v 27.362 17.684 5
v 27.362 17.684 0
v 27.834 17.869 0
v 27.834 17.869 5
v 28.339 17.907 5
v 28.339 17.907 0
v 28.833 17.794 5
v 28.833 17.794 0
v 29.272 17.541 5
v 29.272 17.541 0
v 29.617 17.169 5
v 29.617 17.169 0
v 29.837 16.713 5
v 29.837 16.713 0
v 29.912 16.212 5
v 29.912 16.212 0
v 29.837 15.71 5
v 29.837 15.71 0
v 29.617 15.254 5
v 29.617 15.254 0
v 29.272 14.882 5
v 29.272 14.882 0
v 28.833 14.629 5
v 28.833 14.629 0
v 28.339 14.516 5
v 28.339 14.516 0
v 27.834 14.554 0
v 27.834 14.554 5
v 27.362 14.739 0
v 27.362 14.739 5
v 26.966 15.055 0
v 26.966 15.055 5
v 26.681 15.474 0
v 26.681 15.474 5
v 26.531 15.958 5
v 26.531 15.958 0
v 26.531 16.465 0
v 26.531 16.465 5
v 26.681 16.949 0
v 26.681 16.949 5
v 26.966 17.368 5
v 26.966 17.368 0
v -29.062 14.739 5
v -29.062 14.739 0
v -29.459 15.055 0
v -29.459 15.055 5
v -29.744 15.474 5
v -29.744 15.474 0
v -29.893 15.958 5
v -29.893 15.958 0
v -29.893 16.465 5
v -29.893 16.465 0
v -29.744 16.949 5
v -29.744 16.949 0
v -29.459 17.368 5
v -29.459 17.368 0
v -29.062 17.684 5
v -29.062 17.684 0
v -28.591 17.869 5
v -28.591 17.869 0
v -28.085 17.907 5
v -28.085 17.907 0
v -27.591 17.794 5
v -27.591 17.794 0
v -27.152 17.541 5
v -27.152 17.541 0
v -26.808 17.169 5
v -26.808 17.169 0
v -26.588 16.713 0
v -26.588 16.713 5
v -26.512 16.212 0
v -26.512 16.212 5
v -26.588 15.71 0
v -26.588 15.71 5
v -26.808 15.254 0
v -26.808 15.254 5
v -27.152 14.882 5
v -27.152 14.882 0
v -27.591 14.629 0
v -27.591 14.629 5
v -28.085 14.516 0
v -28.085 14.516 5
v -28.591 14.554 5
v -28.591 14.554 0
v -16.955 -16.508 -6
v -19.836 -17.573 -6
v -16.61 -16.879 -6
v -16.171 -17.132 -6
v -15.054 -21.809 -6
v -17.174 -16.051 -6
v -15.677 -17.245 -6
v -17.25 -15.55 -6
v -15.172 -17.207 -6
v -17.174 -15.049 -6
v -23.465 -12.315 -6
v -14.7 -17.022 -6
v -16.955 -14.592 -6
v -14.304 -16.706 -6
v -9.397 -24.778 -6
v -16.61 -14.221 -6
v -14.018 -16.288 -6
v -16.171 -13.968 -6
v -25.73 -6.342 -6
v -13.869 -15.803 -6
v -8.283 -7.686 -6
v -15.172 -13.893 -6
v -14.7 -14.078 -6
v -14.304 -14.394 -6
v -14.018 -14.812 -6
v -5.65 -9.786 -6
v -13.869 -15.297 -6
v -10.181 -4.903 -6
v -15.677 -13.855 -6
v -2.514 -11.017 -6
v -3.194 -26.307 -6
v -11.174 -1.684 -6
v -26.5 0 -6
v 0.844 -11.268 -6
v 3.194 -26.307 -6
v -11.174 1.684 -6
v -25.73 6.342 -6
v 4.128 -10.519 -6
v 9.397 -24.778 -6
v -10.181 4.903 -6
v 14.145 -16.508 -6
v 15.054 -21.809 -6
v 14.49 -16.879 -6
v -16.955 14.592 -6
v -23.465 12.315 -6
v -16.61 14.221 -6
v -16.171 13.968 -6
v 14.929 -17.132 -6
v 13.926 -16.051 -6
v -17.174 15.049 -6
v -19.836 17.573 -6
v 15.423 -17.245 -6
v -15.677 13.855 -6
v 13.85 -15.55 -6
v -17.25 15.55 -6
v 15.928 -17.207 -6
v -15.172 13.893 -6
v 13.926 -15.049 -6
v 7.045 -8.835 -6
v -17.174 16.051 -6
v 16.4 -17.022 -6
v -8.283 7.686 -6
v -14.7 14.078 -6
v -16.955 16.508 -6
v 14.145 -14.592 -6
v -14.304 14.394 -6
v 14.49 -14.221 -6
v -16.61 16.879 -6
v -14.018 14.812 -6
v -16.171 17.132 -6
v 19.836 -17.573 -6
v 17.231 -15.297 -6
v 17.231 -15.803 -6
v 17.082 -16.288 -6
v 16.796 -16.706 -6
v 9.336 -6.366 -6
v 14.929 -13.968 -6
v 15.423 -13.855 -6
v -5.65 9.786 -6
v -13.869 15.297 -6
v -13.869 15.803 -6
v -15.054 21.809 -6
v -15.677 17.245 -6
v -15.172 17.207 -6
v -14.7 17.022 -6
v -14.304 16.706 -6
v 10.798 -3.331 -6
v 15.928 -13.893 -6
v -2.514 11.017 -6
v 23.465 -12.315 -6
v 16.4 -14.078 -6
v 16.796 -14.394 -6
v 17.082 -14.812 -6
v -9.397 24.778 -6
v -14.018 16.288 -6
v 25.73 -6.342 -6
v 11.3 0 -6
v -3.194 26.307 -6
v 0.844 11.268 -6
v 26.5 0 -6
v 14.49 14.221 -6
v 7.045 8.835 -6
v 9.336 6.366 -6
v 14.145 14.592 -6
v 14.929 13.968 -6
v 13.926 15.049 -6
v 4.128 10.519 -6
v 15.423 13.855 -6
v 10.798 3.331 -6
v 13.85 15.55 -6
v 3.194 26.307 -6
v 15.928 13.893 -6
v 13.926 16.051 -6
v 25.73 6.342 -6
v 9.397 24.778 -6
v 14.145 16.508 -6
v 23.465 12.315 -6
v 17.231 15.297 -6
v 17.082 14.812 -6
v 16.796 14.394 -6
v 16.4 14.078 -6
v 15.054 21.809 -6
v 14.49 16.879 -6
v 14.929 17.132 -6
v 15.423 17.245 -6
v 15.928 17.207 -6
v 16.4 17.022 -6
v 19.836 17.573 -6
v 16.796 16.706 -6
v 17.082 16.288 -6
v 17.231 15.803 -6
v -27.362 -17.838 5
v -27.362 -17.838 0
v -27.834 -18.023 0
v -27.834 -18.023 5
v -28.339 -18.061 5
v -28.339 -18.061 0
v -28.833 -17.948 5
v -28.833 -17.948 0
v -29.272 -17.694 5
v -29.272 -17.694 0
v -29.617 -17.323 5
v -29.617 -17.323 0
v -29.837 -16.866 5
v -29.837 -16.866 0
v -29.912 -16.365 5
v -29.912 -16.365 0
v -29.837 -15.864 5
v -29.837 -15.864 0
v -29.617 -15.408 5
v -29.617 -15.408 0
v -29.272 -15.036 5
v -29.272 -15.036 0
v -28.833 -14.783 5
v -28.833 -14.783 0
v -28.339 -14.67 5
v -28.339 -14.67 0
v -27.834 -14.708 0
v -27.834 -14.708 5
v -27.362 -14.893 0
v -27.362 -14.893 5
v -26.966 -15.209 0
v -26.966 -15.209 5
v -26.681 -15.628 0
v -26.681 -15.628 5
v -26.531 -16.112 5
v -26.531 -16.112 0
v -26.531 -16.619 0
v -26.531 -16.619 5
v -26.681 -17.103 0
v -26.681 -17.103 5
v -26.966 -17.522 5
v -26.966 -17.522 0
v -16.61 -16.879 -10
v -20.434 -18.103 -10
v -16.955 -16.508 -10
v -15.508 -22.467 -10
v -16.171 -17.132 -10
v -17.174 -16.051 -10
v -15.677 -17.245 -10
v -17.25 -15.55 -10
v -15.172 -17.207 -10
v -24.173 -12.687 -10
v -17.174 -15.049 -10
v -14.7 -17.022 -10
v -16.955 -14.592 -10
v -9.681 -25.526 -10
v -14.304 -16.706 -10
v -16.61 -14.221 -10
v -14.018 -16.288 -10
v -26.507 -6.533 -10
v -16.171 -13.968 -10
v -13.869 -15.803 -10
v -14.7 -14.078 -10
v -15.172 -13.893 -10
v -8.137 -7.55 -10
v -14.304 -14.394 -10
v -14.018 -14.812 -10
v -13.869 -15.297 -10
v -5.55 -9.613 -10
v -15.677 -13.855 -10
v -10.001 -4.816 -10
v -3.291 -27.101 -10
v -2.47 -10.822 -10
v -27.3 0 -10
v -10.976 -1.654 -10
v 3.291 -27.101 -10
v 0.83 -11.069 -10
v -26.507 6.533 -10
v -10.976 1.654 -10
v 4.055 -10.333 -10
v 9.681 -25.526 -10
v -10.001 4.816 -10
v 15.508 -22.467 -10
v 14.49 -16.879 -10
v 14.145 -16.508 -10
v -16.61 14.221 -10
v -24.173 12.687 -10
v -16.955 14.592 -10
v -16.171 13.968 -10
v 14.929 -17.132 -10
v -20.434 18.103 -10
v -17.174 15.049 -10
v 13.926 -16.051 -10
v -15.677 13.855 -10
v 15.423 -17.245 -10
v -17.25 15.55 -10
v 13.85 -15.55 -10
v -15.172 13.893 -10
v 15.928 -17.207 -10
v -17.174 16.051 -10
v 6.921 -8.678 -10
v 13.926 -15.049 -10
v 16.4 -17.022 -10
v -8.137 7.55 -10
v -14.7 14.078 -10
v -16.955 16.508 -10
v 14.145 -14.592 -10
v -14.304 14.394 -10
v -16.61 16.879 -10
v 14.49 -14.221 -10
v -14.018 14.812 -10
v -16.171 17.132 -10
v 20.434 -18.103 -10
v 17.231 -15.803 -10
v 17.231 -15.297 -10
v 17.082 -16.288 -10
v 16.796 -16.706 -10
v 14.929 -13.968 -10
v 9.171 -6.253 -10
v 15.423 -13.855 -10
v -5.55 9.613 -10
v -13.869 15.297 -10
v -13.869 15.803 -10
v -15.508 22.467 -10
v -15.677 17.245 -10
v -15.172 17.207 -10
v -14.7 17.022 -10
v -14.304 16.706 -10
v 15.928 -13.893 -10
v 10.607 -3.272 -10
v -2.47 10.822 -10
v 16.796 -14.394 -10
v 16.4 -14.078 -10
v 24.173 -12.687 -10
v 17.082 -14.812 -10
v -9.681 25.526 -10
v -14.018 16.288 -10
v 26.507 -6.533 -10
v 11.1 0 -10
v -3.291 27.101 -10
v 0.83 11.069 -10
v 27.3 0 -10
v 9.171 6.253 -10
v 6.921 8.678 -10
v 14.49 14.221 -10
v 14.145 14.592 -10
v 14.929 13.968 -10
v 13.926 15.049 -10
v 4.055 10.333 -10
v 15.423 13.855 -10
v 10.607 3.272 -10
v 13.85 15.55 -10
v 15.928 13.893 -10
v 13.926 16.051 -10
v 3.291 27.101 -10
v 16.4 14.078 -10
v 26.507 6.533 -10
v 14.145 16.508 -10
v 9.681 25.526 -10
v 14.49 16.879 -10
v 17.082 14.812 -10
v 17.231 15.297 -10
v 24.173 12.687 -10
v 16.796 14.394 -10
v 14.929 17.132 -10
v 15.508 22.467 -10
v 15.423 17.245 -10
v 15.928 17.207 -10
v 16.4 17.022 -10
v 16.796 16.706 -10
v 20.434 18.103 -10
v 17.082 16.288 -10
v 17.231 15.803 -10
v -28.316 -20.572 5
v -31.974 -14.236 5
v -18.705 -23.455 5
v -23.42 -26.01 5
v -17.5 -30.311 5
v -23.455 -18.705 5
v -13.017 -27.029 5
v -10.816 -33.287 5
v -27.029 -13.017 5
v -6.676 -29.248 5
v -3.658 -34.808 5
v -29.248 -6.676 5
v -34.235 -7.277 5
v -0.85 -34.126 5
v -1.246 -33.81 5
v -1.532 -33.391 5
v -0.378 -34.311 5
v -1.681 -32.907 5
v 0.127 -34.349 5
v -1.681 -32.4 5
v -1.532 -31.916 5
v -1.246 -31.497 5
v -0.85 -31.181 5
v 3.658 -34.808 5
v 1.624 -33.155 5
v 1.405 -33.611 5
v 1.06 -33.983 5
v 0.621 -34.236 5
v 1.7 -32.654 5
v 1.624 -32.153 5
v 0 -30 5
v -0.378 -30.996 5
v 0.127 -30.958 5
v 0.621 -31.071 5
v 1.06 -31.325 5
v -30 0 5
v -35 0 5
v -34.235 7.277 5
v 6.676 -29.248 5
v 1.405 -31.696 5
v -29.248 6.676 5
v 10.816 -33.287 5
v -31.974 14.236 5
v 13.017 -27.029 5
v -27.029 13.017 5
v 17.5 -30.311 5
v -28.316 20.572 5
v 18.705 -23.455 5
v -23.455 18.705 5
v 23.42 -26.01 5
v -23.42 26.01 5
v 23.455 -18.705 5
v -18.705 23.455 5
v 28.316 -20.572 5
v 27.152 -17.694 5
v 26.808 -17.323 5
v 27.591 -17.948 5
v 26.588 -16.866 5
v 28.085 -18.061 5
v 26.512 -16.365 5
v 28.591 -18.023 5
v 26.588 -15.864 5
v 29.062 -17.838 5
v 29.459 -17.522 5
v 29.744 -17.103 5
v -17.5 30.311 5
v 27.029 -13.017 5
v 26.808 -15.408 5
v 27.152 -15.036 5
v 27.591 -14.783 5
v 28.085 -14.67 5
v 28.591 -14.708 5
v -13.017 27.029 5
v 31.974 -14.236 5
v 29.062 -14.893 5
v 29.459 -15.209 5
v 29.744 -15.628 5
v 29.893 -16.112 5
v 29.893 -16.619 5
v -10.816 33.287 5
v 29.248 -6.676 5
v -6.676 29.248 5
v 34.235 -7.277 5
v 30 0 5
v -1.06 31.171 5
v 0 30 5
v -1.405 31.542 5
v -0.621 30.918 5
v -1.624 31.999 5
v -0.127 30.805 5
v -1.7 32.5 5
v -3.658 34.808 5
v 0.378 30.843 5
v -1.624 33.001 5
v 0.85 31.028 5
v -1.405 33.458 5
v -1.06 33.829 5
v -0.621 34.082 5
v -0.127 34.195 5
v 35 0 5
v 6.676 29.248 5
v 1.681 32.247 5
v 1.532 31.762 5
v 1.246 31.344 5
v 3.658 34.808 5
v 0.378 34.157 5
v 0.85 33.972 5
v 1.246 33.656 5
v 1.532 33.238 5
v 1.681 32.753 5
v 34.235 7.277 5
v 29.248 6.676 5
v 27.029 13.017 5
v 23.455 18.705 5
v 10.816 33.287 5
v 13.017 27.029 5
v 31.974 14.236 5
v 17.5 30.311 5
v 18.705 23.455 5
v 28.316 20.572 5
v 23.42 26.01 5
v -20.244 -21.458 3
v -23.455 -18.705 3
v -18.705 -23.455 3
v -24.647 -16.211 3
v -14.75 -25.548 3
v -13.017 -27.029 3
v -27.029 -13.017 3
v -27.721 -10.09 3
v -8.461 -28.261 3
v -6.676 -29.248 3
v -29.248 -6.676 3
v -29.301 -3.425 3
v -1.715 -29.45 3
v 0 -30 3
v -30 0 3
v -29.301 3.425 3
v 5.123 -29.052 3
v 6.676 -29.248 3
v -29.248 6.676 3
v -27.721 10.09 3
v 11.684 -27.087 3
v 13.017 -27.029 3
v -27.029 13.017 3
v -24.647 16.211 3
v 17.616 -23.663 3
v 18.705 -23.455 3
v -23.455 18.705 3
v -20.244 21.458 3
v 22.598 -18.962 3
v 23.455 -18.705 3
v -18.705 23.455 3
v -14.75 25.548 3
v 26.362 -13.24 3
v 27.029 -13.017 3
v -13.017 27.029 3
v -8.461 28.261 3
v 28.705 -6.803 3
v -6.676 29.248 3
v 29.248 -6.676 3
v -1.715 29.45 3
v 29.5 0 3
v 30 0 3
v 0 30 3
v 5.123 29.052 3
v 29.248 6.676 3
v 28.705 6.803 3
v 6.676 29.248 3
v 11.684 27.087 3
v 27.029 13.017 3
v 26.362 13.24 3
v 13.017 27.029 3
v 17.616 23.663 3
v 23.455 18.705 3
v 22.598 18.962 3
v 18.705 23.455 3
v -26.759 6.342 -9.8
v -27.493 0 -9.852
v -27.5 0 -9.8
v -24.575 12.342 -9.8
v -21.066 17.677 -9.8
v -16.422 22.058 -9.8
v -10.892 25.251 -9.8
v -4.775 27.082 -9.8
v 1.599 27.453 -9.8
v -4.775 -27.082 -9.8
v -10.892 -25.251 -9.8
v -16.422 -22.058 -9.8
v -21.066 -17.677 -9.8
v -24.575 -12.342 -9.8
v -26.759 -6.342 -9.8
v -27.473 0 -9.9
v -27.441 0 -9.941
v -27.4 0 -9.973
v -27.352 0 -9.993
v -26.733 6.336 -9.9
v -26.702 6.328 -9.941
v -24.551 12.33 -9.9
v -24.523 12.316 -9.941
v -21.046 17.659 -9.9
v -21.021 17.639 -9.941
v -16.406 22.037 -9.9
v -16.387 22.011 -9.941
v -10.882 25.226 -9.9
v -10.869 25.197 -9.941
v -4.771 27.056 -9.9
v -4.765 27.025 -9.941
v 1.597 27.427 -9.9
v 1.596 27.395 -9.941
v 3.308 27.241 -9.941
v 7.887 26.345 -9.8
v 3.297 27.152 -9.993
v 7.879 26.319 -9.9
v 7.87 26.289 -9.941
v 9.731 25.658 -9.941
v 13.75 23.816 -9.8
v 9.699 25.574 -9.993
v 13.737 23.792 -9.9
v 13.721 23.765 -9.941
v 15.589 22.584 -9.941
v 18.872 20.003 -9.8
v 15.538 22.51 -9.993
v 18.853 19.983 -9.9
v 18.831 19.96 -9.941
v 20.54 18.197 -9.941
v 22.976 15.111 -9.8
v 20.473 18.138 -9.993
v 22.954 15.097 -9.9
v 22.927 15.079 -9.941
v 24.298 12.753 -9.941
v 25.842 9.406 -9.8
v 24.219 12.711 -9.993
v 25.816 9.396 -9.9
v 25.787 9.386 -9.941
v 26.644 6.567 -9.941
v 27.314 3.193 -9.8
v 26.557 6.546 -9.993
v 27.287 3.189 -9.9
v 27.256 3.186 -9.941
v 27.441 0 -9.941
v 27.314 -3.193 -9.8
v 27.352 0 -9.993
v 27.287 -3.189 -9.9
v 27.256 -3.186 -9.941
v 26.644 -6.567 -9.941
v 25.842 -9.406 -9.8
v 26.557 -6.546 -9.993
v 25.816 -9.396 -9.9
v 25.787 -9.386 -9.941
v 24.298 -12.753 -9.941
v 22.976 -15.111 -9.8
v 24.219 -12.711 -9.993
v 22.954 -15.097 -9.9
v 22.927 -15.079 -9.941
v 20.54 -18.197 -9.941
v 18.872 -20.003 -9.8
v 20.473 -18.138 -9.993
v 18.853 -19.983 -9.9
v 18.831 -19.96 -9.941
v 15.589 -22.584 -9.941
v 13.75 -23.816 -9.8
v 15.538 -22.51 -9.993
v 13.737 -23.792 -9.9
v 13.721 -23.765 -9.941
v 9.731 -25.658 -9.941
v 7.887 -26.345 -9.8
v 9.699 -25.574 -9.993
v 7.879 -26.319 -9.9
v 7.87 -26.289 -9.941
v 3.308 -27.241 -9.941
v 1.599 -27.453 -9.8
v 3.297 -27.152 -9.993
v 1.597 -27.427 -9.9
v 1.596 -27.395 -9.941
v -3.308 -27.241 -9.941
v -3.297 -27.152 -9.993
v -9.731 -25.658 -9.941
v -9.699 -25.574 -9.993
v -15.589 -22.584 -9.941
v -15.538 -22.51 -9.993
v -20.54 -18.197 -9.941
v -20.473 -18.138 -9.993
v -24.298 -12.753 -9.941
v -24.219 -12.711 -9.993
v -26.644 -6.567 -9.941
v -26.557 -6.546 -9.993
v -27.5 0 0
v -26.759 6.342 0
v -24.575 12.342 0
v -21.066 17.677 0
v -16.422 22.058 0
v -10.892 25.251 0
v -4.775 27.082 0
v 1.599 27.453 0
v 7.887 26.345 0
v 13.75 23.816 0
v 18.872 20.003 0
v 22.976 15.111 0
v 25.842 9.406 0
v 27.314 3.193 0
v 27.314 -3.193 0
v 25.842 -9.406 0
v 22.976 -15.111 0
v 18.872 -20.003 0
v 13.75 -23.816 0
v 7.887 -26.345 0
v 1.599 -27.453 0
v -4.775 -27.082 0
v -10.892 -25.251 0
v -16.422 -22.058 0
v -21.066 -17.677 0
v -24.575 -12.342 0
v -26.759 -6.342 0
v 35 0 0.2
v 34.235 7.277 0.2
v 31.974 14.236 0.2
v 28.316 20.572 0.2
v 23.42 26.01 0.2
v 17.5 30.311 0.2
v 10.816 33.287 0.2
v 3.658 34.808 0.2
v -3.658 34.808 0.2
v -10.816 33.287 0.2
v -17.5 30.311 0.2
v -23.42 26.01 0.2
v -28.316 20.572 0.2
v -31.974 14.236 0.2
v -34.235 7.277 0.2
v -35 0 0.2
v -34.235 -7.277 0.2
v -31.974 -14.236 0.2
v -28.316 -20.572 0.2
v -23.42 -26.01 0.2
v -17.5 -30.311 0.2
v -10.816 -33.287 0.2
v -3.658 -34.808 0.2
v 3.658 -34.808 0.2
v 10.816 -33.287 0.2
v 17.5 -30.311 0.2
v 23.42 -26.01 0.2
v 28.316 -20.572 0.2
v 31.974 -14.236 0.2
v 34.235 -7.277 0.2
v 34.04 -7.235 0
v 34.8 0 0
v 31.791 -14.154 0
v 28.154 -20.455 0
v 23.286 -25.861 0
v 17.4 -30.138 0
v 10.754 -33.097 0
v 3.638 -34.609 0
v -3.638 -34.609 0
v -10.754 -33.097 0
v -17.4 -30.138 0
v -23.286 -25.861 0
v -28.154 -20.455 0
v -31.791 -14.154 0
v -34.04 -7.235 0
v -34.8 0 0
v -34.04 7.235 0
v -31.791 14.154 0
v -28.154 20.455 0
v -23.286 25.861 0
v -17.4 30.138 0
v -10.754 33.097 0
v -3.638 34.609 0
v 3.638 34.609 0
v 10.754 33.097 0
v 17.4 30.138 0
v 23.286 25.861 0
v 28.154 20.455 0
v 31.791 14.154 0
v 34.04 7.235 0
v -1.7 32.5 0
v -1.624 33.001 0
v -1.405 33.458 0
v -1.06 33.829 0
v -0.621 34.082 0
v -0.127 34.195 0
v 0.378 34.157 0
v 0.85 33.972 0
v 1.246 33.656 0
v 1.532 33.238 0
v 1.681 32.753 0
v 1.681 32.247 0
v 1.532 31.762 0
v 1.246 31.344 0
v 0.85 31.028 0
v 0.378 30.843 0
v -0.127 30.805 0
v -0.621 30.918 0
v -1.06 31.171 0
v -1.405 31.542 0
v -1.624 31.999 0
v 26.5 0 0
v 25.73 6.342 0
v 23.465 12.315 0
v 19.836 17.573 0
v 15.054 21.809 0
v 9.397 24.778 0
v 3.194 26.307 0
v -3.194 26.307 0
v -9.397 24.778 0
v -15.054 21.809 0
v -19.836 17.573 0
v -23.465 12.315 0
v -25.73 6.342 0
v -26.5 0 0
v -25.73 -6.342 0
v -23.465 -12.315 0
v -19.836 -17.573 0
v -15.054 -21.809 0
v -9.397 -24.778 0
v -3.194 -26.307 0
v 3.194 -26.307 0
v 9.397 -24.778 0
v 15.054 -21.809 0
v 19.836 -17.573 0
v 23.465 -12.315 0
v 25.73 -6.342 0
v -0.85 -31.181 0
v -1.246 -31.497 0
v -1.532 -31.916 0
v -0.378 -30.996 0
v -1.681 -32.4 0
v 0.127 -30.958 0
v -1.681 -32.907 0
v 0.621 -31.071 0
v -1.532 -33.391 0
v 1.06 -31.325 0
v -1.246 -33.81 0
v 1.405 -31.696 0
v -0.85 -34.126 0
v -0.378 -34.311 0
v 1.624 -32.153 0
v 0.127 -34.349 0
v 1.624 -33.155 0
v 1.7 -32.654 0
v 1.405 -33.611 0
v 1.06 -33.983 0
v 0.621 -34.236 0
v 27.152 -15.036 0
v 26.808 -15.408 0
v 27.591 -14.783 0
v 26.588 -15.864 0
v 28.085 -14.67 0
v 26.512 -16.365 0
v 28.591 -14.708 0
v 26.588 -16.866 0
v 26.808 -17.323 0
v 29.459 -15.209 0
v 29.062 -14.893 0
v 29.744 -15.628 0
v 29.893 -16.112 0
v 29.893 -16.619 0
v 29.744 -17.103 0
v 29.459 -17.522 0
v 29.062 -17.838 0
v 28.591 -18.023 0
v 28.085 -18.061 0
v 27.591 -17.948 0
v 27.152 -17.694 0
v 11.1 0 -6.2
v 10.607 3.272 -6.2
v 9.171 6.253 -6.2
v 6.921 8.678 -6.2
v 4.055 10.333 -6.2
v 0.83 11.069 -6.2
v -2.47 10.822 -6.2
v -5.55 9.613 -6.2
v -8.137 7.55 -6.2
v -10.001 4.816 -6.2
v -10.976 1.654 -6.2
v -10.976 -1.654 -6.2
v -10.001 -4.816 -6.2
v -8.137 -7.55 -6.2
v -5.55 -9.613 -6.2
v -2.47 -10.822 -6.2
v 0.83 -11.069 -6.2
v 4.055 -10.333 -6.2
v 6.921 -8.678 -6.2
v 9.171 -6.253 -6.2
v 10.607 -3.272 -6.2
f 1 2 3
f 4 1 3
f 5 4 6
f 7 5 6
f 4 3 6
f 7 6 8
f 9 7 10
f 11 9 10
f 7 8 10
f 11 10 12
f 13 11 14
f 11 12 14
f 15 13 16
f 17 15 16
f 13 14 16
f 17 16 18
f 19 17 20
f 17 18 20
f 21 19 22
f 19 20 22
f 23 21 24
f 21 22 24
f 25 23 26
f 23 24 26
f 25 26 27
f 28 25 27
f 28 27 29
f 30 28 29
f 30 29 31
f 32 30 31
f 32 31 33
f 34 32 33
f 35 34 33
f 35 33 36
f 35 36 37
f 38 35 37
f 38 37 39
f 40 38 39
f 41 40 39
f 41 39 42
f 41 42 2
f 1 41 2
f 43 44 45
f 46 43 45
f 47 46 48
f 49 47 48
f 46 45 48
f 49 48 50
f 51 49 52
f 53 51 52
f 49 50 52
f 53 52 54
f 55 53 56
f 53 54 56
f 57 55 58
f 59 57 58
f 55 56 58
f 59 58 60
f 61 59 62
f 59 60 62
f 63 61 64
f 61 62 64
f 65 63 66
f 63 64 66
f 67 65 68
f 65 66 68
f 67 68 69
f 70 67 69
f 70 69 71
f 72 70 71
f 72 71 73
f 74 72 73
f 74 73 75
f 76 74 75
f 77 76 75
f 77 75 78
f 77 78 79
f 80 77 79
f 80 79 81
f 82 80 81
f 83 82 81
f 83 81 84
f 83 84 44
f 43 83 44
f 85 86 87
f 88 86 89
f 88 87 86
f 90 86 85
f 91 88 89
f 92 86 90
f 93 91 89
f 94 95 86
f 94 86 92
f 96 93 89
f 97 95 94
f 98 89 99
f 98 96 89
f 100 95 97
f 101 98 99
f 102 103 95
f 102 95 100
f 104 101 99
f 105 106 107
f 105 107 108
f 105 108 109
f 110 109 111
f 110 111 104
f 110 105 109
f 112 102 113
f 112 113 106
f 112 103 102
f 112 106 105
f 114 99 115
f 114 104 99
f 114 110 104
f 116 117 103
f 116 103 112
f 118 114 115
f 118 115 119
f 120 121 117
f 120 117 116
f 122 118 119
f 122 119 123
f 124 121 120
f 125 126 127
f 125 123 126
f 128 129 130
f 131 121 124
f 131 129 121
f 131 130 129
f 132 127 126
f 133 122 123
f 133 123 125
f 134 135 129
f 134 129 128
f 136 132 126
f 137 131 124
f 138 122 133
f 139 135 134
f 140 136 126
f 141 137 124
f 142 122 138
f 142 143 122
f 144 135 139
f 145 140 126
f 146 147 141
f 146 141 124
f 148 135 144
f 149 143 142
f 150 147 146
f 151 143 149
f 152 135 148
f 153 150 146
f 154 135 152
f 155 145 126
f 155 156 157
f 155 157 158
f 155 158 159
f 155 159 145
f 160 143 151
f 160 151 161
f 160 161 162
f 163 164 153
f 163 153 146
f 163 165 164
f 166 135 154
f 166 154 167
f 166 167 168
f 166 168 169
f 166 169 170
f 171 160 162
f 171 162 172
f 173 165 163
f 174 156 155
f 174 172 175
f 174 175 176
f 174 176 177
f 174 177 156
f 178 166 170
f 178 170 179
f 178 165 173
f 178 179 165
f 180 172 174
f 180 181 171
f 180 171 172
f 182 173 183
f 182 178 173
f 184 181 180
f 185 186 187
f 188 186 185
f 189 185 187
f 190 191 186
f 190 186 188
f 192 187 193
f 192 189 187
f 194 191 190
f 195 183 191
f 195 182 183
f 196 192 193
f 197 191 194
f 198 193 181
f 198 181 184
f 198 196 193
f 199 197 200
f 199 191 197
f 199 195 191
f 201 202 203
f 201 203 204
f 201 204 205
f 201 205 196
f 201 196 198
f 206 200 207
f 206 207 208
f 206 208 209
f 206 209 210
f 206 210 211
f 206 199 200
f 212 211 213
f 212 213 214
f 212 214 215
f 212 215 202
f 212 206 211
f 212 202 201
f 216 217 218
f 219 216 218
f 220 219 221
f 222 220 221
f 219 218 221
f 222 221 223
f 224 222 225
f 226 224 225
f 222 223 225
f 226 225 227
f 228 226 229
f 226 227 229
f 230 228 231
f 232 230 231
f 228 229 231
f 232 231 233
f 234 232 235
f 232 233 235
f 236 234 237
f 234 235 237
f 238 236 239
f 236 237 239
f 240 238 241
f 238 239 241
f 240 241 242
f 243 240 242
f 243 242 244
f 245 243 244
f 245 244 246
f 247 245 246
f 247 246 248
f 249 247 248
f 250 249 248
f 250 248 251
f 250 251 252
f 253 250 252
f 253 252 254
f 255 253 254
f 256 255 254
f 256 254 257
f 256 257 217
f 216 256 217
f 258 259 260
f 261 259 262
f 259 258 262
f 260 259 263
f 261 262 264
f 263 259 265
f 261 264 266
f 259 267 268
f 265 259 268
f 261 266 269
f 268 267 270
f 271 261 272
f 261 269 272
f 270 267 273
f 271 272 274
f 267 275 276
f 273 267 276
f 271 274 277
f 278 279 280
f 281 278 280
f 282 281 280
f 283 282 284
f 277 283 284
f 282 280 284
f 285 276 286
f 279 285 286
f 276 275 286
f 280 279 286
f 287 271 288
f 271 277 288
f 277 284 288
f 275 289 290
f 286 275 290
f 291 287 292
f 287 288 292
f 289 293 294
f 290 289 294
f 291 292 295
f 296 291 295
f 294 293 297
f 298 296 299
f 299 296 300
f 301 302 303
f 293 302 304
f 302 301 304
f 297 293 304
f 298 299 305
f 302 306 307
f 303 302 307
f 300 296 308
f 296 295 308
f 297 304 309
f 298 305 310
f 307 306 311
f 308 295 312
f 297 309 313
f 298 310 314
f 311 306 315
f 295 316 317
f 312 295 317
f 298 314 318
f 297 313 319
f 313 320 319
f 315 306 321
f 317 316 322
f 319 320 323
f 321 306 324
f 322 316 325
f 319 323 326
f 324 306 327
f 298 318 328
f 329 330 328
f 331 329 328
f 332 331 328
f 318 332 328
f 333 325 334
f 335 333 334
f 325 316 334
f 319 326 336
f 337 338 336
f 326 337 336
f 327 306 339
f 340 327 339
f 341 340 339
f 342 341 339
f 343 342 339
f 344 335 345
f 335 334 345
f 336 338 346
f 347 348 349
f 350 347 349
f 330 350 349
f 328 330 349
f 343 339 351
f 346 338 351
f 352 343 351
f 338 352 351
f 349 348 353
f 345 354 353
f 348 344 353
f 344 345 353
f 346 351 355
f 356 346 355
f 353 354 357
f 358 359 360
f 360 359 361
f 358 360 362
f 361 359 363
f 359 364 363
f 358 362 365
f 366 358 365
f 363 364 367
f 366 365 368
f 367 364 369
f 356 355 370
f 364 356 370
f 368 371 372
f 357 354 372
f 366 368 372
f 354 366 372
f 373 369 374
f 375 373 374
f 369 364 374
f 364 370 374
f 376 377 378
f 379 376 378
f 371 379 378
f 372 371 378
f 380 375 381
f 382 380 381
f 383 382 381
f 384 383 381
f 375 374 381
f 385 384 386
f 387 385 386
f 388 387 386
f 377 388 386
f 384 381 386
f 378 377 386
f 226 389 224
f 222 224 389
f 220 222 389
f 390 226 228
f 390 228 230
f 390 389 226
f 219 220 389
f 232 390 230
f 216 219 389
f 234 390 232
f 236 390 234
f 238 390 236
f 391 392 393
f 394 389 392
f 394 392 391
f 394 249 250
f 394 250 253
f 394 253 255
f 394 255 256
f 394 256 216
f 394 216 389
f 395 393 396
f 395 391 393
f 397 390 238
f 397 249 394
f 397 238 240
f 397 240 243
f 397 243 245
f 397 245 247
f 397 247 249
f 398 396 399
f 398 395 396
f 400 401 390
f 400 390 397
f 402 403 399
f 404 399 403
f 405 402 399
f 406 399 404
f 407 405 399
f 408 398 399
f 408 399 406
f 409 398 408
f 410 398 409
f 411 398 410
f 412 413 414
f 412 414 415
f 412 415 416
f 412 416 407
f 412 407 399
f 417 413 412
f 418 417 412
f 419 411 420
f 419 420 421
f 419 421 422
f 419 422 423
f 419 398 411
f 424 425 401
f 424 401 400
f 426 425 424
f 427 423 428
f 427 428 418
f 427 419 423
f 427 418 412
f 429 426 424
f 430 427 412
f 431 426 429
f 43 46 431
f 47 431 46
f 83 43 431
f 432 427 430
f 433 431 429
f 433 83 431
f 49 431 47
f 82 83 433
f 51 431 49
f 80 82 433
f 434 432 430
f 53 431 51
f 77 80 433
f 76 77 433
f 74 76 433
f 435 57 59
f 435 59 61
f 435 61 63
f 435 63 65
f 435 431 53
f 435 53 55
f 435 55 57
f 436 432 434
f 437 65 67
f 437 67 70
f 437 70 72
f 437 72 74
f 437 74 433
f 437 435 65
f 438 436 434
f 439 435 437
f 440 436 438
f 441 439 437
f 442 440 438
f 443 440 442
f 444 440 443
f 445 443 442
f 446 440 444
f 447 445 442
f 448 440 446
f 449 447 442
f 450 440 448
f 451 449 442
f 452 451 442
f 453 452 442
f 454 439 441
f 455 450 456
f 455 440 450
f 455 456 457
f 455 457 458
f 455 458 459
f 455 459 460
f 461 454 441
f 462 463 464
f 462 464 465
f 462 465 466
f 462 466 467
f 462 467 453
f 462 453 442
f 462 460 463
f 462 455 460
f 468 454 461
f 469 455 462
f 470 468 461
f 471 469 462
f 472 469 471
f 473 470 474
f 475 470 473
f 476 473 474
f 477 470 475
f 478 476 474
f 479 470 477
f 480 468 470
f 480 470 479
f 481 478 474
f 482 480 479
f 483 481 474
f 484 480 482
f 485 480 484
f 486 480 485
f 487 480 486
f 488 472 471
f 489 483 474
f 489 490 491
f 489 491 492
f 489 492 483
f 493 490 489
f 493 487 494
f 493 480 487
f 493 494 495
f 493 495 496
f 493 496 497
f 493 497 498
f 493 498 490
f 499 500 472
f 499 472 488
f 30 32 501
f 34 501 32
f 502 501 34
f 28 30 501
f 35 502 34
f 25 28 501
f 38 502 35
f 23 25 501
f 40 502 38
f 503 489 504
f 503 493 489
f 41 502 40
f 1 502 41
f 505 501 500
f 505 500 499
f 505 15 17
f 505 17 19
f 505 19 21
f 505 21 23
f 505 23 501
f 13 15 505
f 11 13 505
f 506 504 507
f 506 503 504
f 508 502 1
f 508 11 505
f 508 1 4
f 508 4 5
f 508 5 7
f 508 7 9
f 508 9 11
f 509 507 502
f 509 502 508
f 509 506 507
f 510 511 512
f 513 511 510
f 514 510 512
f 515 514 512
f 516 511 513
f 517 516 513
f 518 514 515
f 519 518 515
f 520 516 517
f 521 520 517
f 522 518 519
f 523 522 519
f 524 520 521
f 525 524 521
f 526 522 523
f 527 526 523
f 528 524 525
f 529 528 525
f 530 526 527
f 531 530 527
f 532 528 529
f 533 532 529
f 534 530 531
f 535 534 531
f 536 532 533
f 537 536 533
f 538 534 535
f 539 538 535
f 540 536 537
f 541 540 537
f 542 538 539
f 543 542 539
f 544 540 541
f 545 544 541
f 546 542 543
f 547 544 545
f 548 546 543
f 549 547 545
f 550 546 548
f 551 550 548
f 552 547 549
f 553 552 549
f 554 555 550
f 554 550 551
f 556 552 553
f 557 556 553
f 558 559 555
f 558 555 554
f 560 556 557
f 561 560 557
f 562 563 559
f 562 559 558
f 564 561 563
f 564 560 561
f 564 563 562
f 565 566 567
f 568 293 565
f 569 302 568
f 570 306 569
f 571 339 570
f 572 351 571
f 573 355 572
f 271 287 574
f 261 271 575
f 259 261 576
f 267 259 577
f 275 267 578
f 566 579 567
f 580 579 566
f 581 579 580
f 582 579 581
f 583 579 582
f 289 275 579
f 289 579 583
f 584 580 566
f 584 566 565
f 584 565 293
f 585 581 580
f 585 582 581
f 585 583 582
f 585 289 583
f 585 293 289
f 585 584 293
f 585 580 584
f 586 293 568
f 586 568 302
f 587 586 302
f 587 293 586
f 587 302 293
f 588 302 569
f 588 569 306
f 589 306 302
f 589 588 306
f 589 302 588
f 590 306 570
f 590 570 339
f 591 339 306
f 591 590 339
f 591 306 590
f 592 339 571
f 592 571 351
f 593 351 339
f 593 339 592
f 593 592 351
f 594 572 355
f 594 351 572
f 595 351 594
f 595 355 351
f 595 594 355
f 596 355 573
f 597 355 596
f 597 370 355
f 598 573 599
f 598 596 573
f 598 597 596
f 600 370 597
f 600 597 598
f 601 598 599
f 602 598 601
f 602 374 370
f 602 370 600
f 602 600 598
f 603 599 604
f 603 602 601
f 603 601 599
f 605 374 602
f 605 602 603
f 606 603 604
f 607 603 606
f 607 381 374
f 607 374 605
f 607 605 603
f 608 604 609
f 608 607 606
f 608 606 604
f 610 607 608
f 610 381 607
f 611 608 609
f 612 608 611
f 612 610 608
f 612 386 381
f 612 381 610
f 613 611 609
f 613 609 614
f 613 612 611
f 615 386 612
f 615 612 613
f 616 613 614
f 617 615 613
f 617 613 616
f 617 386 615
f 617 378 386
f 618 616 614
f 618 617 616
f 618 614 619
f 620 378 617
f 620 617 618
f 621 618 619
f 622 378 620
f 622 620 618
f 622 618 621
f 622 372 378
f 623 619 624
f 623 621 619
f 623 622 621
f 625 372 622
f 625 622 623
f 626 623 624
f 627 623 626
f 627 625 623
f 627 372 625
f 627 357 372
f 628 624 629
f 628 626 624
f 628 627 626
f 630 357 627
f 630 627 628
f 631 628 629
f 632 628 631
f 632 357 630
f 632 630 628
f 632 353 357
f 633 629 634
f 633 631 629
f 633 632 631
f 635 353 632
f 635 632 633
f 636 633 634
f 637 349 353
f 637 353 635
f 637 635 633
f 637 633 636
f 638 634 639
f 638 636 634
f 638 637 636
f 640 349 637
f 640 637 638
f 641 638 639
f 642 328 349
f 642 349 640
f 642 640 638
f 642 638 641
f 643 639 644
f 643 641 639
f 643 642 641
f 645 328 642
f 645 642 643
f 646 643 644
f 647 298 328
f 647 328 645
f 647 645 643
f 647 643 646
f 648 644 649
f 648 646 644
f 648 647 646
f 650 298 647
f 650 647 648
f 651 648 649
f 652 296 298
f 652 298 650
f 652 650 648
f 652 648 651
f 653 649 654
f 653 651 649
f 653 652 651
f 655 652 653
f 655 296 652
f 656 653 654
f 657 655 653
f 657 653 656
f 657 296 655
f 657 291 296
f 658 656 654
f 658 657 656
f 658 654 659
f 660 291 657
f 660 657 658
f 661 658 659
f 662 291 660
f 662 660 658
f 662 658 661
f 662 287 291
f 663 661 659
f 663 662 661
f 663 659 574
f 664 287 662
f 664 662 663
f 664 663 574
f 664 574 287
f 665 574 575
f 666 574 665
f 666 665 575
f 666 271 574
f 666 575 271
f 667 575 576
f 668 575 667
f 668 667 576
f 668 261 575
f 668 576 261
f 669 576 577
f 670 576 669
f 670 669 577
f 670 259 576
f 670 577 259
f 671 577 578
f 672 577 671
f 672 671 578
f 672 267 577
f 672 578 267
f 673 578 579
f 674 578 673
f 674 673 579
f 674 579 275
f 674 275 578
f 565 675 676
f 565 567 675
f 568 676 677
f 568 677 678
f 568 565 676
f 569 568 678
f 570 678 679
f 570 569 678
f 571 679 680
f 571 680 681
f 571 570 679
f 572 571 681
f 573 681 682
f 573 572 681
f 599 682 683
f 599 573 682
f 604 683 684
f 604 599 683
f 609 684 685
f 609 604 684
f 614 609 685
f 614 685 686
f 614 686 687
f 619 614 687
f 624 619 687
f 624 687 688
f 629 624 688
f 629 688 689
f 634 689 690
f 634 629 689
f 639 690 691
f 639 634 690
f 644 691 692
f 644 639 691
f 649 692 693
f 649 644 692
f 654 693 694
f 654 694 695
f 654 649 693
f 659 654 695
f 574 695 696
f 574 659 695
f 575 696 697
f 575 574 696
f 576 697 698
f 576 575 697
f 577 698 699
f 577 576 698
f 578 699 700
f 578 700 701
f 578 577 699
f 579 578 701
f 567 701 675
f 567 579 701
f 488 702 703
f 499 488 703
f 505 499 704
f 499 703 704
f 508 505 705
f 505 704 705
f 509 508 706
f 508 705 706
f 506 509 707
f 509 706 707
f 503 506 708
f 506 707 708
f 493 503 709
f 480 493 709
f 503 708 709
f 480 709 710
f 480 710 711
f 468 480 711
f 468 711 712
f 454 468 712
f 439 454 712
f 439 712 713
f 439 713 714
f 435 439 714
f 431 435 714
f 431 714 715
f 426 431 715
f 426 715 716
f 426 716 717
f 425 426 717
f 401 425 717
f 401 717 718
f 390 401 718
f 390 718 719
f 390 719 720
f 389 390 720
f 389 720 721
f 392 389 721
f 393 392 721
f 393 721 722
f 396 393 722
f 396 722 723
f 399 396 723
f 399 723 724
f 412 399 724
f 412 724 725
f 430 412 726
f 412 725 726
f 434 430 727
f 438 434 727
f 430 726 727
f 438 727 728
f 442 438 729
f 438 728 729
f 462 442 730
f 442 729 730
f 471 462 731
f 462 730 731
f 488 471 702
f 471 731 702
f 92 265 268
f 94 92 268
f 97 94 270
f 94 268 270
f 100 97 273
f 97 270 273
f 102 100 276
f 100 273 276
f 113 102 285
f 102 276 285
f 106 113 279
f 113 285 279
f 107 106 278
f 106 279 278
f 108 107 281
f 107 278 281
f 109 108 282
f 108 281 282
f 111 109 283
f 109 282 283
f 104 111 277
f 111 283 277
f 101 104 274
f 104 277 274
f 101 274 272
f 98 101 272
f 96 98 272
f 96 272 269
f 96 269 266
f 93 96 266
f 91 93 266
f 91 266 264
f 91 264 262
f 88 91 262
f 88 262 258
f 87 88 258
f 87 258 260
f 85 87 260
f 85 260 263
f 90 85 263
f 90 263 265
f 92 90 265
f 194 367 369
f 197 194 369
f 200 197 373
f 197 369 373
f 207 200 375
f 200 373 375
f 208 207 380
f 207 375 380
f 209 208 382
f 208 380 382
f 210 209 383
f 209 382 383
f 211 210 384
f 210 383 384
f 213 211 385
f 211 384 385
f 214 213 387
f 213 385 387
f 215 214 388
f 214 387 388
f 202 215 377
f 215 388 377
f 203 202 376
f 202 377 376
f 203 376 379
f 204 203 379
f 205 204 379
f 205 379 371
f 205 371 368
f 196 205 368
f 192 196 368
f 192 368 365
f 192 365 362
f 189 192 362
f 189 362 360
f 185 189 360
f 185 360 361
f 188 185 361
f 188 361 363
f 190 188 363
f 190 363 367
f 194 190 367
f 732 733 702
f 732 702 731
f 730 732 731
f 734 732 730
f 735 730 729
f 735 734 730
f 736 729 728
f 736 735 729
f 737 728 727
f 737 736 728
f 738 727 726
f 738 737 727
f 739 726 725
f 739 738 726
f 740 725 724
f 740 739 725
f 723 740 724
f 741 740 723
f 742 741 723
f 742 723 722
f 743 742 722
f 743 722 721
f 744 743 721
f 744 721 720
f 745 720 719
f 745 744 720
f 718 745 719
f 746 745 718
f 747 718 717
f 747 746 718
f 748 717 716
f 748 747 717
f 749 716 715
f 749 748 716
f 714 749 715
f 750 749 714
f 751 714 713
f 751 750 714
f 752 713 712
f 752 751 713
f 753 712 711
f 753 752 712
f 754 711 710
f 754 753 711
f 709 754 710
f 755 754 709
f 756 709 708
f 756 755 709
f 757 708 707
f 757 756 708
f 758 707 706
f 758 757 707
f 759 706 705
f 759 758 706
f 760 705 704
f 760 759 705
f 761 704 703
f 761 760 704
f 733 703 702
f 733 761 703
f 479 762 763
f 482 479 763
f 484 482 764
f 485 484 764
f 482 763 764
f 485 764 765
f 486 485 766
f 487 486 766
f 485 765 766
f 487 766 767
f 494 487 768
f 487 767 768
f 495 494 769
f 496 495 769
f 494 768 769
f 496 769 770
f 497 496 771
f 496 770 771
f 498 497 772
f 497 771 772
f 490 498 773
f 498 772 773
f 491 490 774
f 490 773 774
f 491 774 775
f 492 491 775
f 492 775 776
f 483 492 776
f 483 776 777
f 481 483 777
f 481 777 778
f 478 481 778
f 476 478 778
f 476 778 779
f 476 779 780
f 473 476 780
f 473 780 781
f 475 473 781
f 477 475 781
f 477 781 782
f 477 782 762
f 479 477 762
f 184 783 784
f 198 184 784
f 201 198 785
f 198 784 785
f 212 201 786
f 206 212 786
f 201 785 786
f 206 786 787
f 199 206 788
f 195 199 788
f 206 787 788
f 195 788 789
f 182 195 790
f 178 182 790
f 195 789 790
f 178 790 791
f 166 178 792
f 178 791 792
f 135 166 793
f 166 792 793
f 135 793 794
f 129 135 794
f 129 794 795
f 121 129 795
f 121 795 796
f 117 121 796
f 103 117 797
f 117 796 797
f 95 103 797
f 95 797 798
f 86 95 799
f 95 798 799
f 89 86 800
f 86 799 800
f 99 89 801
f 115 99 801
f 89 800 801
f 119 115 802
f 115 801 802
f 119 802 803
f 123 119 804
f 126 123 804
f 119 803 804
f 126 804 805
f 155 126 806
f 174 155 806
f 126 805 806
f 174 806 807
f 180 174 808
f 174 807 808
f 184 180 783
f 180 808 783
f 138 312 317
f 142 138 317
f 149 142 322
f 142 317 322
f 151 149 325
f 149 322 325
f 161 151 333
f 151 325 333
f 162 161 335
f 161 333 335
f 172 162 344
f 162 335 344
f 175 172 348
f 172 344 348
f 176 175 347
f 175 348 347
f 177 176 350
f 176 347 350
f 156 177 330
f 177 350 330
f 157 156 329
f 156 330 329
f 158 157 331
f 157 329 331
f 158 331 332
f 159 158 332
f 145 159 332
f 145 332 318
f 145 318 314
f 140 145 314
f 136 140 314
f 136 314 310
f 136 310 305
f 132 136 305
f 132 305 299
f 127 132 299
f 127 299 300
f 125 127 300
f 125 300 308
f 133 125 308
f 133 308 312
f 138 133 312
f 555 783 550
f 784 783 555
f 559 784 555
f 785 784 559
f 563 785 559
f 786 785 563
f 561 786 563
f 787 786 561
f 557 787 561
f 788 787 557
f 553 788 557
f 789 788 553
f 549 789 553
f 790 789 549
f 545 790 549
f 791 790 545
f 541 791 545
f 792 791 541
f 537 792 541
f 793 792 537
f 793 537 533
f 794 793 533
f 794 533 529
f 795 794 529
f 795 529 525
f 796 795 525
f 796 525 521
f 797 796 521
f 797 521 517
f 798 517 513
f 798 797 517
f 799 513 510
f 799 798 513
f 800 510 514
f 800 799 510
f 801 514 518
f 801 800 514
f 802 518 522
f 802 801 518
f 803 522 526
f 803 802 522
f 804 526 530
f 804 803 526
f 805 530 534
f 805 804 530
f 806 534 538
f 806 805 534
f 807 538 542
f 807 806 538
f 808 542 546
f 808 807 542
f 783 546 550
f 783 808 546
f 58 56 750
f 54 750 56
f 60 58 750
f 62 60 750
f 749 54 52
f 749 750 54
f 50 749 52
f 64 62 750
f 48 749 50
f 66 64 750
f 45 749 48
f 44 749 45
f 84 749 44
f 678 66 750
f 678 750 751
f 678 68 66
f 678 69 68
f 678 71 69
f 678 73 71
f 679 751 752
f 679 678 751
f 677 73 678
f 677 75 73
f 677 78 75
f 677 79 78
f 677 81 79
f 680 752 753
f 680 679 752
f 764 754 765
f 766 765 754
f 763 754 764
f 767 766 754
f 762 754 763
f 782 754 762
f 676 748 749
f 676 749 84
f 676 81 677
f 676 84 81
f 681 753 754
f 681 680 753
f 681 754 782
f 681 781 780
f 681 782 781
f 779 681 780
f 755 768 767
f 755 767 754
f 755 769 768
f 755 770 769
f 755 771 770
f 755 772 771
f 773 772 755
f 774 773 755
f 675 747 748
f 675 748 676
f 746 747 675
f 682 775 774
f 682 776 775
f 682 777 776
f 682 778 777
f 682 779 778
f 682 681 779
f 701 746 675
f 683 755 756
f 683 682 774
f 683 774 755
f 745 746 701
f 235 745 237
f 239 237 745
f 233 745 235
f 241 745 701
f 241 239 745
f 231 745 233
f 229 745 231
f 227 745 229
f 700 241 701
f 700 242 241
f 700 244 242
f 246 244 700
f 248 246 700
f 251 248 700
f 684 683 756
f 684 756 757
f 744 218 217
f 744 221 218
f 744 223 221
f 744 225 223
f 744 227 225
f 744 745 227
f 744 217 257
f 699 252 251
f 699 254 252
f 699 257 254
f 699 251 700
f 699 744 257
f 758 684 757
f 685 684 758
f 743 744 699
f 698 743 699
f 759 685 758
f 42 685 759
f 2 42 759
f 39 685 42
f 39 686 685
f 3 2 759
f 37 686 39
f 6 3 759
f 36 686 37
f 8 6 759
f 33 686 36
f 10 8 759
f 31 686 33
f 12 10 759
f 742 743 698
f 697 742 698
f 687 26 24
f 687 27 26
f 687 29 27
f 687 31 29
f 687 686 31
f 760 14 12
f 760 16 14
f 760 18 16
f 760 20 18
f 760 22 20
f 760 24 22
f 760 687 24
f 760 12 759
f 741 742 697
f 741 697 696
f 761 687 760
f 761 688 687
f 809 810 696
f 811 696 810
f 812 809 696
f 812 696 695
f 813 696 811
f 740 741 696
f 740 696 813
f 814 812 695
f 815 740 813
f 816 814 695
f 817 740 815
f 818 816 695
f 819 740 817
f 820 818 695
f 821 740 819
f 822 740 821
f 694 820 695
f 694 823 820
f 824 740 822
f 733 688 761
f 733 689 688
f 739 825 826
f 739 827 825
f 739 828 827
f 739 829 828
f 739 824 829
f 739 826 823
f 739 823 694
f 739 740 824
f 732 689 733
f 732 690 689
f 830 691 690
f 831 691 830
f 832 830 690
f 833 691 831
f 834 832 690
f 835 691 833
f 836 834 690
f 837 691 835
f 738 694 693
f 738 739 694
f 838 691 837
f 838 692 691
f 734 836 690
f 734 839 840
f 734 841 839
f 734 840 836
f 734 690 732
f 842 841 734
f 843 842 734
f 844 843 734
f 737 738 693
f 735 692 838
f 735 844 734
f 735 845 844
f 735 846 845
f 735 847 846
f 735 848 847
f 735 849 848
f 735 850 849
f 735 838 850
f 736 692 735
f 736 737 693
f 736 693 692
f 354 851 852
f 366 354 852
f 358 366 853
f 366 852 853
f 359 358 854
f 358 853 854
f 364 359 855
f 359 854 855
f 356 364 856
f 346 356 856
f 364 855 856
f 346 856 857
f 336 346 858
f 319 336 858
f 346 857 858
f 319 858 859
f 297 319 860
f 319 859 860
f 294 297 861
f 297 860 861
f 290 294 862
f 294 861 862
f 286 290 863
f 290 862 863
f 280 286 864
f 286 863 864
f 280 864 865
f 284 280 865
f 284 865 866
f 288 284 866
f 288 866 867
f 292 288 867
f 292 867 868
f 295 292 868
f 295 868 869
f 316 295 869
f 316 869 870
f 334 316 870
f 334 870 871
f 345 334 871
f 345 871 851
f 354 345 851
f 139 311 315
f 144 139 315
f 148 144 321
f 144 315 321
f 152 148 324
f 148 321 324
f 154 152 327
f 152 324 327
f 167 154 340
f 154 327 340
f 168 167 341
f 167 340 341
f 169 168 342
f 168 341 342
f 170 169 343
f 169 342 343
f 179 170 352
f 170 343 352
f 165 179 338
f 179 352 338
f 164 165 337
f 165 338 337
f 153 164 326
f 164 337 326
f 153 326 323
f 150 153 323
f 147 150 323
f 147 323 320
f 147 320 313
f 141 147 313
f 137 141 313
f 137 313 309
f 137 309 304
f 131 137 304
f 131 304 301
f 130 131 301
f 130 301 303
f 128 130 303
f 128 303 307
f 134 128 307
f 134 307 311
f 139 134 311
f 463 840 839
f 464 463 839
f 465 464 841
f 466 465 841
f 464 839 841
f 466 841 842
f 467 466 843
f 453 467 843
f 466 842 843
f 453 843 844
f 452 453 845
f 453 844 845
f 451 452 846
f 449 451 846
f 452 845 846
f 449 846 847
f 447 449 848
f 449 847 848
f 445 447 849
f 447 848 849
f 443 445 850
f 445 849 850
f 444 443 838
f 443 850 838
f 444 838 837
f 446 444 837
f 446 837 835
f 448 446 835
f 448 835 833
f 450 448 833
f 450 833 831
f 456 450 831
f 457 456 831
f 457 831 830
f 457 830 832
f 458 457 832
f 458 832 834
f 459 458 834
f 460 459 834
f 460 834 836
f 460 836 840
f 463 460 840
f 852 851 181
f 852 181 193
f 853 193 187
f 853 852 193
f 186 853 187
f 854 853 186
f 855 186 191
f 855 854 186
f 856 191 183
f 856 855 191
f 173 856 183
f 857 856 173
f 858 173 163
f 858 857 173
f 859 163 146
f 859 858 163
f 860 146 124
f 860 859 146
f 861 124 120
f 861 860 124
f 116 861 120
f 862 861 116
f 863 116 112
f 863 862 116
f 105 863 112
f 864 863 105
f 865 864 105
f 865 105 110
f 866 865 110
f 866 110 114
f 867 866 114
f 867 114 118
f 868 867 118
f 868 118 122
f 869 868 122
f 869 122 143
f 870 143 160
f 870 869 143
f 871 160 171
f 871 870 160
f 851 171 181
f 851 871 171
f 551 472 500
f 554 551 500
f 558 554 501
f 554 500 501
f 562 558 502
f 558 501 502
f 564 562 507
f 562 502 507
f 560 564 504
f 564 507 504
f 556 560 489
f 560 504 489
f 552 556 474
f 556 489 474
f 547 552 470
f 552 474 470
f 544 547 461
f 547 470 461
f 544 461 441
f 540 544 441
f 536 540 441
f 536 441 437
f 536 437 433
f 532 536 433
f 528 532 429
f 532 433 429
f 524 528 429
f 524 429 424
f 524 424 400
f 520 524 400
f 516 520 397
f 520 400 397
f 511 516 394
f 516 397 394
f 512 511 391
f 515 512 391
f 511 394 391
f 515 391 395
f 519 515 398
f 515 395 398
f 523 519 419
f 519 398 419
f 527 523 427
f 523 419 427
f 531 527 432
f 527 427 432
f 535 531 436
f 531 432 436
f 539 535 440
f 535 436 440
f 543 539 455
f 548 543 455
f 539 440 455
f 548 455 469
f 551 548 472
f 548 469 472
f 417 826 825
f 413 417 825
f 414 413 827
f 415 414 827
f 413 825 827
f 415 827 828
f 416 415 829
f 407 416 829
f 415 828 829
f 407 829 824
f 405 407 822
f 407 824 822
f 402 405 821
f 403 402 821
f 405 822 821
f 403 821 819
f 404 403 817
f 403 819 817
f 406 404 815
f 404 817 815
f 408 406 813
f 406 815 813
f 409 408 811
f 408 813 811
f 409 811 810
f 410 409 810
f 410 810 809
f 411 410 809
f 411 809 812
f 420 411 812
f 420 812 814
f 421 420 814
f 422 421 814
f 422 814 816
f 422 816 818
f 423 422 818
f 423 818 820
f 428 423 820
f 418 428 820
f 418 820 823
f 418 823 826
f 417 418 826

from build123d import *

# Parameters (mm, degrees)
BOSS_EXTRUDE1_DEPTH      = 5
BOSS_EXTRUDE1_DEPTH_BACK = 10
SKETCH1_R                = 35
M3_CLEARANCE_HOLE1_D     = 3.4
CIRPATTERN1_COUNT        = 6
SKETCH4_R                = 30
CUT_EXTRUDE1_DEPTH       = 2
M3_CLEARANCE_HOLE2_D     = 3.4
SKETCH8_R                = 35
SKETCH8_R_2              = 27.5
CUT_EXTRUDE4_DEPTH       = 4
FILLET1_R                = 0.2
SKETCH9_R                = 11.1
CUT_EXTRUDE5_DEPTH       = 10
SKETCH10_R               = 35
SKETCH10_R_2             = 27.5
CUT_EXTRUDE6_DEPTH       = 10
SKETCH11_R               = 26.5
CUT_EXTRUDE7_DEPTH       = 9
SKETCH12_R               = 11.1
CUT_EXTRUDE8_DEPTH       = 9
CHAMFER1_SIZE            = 0.2
CHAMFER2_SIZE            = 3


with BuildPart() as part:
    # Sketch1 → Boss-Extrude1 (new, two sides: drawn at the far end of the back side and taken through both)
    with BuildSketch(Plane.XY.offset(-BOSS_EXTRUDE1_DEPTH_BACK)):
        Circle(SKETCH1_R)
    extrude(amount=BOSS_EXTRUDE1_DEPTH + BOSS_EXTRUDE1_DEPTH_BACK)

    # M3 Clearance Hole1 (through all)
    with Locations(Plane.XY.offset(5)):
        with Locations((0, 32.5)):
            m3_clearance_hole1 = Hole(M3_CLEARANCE_HOLE1_D / 2)

    # CirPattern1: M3 Clearance Hole1 ×6 about axis
    cirpattern1_axis = Axis((0, -0.076854784, 0), (0, 0, 1))
    for i in range(1, CIRPATTERN1_COUNT):
        add(m3_clearance_hole1.rotate(cirpattern1_axis, i * 360 / CIRPATTERN1_COUNT), mode=Mode.SUBTRACT)

    # Sketch4 → Cut-Extrude1 (cut)
    with BuildSketch(Plane.XY.offset(5)):
        Circle(SKETCH4_R)
    extrude(amount=-CUT_EXTRUDE1_DEPTH, mode=Mode.SUBTRACT)

    # M3 Clearance Hole2 (through all)
    with Locations(Plane(origin=(-15.55, 15.55, 3), x_dir=(1, 0, 0), z_dir=(0, 0, 1))):
        with Locations((0, 0), (31.1, 0), (31.1, -31.1), (0, -31.1)):
            Hole(M3_CLEARANCE_HOLE2_D / 2)

    # Sketch8 → Cut-Extrude4 (cut)
    with BuildSketch(Plane(origin=(0, 0, -10), x_dir=(-1, 0, 0), z_dir=(0, 0, -1))):
        with Locations(Location((0, 0, 0), (0, 0, 180))):
            Circle(SKETCH8_R)
        Circle(SKETCH8_R_2, mode=Mode.SUBTRACT)
    extrude(amount=-CUT_EXTRUDE4_DEPTH, mode=Mode.SUBTRACT)

    # Fillet1
    fillet1_edges = [part.edges().sort_by_distance(p)[0] for p in [
        (-35, 0, -6),
        (27.5, 0, -10),
    ]]
    fillet(fillet1_edges, radius=FILLET1_R)

    # Sketch9 → Cut-Extrude5 (cut)
    with BuildSketch(Plane.XY.offset(3)):
        Circle(SKETCH9_R)
    extrude(amount=-CUT_EXTRUDE5_DEPTH, mode=Mode.SUBTRACT)

    # Sketch10 → Cut-Extrude6 (cut)
    with BuildSketch(Plane(origin=(0, 0, -10), x_dir=(-1, 0, 0), z_dir=(0, 0, -1))):
        with Locations(Location((0, 0, 0), (0, 0, 180))):
            Circle(SKETCH10_R)
        Circle(SKETCH10_R_2, mode=Mode.SUBTRACT)
    extrude(amount=-CUT_EXTRUDE6_DEPTH, mode=Mode.SUBTRACT)

    # Sketch11 → Cut-Extrude7 (cut)
    with BuildSketch(Plane.XY.offset(3)):
        Circle(SKETCH11_R)
    extrude(amount=-CUT_EXTRUDE7_DEPTH, mode=Mode.SUBTRACT)

    # Sketch12 → Cut-Extrude8 (cut)
    with BuildSketch(Plane.XY.offset(-7)):
        Circle(SKETCH12_R)
    extrude(amount=-CUT_EXTRUDE8_DEPTH, mode=Mode.SUBTRACT)

    # Chamfer1
    chamfer1_edges = [part.edges().sort_by_distance(p)[0] for p in [
        (-35, 0, 0),
        (-11.1, 0, -6),
    ]]
    chamfer(chamfer1_edges, length=CHAMFER1_SIZE)

    # Chamfer2
    chamfer2_edges = [part.edges().sort_by_distance(p)[0] for p in [
        (-26.5, 0, 3),
    ]]
    chamfer(chamfer2_edges, length=CHAMFER2_SIZE)


solid = part.part
